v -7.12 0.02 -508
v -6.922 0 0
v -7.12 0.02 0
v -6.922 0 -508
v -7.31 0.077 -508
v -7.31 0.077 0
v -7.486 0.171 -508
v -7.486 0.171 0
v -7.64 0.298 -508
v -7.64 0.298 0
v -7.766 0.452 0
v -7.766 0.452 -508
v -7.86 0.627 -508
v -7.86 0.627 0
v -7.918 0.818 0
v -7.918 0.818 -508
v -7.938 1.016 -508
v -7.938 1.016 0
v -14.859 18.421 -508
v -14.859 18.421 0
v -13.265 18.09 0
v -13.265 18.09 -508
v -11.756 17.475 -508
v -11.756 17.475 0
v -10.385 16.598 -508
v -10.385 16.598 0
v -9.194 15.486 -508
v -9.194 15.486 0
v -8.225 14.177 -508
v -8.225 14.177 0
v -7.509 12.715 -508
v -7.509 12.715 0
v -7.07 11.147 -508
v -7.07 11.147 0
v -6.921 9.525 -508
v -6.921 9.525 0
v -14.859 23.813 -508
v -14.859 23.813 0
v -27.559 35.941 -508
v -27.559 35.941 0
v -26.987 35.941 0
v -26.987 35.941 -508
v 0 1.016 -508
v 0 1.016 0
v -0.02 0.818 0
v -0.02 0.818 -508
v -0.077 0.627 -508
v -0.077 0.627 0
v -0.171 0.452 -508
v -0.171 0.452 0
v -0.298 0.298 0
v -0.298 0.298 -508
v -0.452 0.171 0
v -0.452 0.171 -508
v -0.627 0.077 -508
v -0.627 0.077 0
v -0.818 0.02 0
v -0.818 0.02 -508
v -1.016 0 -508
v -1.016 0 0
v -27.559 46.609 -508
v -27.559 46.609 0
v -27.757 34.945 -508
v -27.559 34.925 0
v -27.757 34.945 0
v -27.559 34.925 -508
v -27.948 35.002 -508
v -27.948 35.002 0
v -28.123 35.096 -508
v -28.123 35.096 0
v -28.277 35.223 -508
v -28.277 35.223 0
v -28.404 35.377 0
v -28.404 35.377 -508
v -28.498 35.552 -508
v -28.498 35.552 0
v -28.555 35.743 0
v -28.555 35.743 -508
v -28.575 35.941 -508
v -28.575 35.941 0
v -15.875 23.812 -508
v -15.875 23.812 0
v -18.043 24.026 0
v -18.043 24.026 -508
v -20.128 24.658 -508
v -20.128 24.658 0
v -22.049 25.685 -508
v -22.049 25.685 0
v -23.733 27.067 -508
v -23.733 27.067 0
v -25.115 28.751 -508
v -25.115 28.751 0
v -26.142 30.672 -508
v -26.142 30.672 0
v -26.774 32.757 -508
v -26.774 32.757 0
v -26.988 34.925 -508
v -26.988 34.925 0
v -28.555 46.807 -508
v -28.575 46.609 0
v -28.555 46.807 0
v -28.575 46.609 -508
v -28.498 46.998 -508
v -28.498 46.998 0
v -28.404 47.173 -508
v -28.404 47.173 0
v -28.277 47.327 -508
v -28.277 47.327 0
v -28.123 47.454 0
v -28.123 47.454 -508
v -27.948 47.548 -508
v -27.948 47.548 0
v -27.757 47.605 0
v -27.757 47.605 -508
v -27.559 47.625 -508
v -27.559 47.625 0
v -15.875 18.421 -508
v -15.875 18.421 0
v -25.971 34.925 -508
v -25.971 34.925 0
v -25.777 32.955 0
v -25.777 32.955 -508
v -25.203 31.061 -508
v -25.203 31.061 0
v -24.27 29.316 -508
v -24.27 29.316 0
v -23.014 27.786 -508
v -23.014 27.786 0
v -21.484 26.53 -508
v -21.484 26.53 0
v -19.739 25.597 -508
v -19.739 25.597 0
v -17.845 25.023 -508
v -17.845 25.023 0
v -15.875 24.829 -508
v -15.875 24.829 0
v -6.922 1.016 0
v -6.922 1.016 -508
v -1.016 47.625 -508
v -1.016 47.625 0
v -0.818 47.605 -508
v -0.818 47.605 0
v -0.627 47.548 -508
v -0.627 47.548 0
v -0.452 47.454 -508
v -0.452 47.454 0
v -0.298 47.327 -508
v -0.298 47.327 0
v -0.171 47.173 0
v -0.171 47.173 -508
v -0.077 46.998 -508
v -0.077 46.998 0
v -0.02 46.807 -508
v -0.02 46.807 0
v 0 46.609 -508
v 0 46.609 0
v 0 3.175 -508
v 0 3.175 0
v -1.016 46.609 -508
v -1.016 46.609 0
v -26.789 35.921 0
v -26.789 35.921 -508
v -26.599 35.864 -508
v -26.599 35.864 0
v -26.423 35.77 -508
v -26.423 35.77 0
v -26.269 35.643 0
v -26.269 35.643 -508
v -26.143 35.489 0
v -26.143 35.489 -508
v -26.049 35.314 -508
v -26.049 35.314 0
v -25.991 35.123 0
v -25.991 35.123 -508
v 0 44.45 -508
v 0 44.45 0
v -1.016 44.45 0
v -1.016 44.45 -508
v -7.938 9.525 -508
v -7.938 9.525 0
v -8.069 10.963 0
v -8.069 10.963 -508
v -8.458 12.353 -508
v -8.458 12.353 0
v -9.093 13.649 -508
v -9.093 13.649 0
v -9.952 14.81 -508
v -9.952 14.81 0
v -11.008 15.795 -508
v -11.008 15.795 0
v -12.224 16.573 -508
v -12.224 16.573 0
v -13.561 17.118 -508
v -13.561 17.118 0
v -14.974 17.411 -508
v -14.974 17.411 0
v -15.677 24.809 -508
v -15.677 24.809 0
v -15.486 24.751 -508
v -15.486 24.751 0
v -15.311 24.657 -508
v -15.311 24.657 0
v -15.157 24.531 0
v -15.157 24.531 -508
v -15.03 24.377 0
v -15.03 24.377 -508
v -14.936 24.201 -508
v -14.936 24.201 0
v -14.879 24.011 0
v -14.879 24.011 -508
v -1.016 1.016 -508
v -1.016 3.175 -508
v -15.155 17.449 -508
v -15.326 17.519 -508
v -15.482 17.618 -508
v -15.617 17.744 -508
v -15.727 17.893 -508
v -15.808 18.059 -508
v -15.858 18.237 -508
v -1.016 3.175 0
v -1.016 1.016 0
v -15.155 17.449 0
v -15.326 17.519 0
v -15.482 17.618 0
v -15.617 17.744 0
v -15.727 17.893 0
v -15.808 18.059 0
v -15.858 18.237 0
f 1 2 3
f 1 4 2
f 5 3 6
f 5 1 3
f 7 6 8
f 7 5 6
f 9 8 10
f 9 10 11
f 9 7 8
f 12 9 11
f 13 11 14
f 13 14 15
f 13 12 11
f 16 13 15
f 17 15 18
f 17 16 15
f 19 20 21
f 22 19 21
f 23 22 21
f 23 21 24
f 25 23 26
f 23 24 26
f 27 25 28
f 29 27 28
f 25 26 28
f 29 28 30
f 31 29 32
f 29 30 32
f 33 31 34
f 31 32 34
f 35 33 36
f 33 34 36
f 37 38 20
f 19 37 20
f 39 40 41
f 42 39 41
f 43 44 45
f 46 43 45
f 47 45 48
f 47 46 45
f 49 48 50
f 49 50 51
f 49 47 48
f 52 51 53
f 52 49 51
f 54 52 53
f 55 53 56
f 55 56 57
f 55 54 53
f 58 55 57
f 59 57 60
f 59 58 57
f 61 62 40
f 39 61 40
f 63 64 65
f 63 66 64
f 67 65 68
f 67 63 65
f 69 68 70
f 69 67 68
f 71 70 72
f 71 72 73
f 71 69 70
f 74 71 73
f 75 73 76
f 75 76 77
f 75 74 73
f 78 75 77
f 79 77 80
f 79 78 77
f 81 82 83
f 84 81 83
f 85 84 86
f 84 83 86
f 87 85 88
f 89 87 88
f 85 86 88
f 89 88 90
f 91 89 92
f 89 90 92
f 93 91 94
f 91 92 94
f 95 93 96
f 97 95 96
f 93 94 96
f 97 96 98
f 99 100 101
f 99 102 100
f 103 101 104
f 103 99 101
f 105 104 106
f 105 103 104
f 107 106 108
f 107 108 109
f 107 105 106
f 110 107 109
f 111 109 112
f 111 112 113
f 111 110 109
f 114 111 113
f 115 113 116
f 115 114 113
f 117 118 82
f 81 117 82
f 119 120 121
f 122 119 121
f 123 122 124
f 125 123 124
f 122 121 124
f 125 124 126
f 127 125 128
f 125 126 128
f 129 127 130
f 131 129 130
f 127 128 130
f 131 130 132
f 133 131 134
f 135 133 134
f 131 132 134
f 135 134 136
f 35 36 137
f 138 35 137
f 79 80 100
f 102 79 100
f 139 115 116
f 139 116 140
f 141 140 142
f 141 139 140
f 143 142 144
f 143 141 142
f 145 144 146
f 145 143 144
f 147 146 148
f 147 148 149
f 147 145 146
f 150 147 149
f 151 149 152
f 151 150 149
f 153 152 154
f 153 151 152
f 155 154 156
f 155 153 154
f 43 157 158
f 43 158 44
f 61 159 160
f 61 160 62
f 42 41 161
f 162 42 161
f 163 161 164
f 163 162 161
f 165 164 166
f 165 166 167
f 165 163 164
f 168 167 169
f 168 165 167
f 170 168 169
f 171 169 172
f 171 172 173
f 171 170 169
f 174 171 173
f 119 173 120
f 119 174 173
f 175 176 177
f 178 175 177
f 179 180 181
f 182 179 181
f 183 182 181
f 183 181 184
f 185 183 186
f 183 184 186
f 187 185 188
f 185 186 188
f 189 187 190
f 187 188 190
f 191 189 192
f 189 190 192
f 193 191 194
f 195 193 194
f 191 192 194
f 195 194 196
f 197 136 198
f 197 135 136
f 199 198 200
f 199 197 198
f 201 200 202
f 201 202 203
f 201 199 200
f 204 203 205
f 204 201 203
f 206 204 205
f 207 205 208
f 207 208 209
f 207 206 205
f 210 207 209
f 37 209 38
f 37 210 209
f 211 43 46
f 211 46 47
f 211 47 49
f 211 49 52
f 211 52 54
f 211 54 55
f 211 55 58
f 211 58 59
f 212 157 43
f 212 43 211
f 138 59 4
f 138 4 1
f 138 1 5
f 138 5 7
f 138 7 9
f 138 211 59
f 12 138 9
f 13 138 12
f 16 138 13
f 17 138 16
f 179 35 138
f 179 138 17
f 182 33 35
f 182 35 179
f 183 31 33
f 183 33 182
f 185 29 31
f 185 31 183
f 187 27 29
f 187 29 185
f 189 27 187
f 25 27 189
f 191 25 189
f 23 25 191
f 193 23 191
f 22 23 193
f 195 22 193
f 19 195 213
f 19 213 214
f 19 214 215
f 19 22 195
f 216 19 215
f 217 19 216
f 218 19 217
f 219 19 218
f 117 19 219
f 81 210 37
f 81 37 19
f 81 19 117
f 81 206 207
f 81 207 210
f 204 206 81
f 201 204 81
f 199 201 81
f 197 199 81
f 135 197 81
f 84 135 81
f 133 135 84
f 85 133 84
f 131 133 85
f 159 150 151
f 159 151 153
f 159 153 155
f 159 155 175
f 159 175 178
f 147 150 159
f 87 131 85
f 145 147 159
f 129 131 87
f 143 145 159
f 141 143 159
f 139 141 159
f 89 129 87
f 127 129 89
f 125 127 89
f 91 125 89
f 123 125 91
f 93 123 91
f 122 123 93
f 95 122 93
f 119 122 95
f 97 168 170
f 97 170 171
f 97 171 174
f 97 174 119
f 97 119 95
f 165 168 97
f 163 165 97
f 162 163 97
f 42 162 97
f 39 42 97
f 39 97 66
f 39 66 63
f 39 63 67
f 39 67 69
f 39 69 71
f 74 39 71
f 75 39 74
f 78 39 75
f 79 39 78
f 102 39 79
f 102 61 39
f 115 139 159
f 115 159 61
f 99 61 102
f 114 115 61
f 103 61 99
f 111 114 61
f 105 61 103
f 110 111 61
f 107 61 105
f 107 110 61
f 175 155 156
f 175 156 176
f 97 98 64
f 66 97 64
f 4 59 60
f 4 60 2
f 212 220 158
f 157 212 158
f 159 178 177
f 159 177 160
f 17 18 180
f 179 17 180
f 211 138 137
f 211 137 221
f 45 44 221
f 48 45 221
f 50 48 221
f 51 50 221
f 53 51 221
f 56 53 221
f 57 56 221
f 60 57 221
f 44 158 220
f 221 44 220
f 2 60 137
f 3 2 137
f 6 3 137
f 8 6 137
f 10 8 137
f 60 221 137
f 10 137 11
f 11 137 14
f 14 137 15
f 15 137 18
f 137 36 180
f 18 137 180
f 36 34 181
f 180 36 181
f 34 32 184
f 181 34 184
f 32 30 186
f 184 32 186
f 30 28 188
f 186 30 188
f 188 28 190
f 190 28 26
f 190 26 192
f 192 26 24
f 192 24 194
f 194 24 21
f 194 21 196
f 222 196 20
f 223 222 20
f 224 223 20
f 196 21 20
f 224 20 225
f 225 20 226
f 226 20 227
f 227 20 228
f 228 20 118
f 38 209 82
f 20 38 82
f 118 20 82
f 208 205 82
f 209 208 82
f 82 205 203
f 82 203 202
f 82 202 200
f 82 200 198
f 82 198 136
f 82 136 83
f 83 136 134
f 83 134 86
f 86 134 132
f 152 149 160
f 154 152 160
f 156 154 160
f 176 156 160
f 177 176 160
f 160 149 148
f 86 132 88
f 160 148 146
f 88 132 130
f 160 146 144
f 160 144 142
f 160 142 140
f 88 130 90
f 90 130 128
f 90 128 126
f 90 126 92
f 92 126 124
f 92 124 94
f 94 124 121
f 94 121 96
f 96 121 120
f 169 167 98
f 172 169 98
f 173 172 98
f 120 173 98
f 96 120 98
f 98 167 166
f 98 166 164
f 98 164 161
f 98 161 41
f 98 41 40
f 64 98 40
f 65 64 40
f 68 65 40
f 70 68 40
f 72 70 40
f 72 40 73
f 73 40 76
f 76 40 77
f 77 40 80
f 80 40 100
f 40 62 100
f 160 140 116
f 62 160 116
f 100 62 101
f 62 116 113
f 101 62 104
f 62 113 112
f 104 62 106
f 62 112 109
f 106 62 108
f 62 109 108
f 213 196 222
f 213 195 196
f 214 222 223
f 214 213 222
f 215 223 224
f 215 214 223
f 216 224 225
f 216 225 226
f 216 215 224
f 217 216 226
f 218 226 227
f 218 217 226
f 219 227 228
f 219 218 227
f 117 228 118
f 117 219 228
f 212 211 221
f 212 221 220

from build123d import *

# Parameters (mm, degrees)
EXTRUDE_THIN1_DEPTH = 508
FILLET1_R           = 1.016


with BuildPart() as part:
    # Sketch1 → Extrude-Thin1 (new body)
    with BuildSketch(Plane.XY):
        with BuildLine():
            Line((0, 3.175), (0, 0))
            Line((0, 0), (-7.9375, 0))
            Line((-7.9375, 0), (-7.9375, 9.525))
            ThreePointArc((-7.9375, 9.525), (-10.26234, 15.13766), (-15.875, 17.4625))
            Line((-15.875, 17.4625), (-15.875, 23.8125))
            ThreePointArc((-15.875, 23.8125), (-23.732724, 27.067276), (-26.9875, 34.925))
            Line((-26.9875, 34.925), (-28.575, 34.925))
            Line((-28.575, 34.925), (-28.575, 47.625))
            Line((-28.575, 47.625), (0, 47.625))
            Line((0, 47.625), (0, 44.45))
            Line((0, 44.45), (-1.016, 44.45))
            Line((-1.016, 44.45), (-1.016, 46.609))
            Line((-1.016, 46.609), (-27.559, 46.609))
            Line((-27.559, 46.609), (-27.559, 35.941))
            Line((-27.559, 35.941), (-25.92025, 35.941))
            ThreePointArc((-25.92025, 35.941), (-23.014304, 27.785696), (-14.859, 24.87975))
            Line((-14.859, 24.87975), (-14.859, 18.420668))
            ThreePointArc((-14.859, 18.420668), (-9.194359, 15.486057), (-6.9215, 9.525))
            Line((-6.9215, 9.525), (-6.9215, 1.016))
            Line((-6.9215, 1.016), (-1.016, 1.016))
            Line((-1.016, 1.016), (-1.016, 3.175))
            Line((-1.016, 3.175), (0, 3.175))
        make_face()
    extrude(amount=-EXTRUDE_THIN1_DEPTH)

    # Fillet1
    fillet1_edges = [part.edges().sort_by_distance(p)[0] for p in [
        (-25.92025, 35.941, -254),
        (-14.859, 24.87975, -254),
        (0, 0, -254),
        (-7.9375, 0, -254),
        (-15.875, 17.4625, -254),
        (-28.575, 34.925, -254),
        (-28.575, 47.625, -254),
        (0, 47.625, -254),
    ]]
    fillet(fillet1_edges, radius=FILLET1_R)


solid = part.part
